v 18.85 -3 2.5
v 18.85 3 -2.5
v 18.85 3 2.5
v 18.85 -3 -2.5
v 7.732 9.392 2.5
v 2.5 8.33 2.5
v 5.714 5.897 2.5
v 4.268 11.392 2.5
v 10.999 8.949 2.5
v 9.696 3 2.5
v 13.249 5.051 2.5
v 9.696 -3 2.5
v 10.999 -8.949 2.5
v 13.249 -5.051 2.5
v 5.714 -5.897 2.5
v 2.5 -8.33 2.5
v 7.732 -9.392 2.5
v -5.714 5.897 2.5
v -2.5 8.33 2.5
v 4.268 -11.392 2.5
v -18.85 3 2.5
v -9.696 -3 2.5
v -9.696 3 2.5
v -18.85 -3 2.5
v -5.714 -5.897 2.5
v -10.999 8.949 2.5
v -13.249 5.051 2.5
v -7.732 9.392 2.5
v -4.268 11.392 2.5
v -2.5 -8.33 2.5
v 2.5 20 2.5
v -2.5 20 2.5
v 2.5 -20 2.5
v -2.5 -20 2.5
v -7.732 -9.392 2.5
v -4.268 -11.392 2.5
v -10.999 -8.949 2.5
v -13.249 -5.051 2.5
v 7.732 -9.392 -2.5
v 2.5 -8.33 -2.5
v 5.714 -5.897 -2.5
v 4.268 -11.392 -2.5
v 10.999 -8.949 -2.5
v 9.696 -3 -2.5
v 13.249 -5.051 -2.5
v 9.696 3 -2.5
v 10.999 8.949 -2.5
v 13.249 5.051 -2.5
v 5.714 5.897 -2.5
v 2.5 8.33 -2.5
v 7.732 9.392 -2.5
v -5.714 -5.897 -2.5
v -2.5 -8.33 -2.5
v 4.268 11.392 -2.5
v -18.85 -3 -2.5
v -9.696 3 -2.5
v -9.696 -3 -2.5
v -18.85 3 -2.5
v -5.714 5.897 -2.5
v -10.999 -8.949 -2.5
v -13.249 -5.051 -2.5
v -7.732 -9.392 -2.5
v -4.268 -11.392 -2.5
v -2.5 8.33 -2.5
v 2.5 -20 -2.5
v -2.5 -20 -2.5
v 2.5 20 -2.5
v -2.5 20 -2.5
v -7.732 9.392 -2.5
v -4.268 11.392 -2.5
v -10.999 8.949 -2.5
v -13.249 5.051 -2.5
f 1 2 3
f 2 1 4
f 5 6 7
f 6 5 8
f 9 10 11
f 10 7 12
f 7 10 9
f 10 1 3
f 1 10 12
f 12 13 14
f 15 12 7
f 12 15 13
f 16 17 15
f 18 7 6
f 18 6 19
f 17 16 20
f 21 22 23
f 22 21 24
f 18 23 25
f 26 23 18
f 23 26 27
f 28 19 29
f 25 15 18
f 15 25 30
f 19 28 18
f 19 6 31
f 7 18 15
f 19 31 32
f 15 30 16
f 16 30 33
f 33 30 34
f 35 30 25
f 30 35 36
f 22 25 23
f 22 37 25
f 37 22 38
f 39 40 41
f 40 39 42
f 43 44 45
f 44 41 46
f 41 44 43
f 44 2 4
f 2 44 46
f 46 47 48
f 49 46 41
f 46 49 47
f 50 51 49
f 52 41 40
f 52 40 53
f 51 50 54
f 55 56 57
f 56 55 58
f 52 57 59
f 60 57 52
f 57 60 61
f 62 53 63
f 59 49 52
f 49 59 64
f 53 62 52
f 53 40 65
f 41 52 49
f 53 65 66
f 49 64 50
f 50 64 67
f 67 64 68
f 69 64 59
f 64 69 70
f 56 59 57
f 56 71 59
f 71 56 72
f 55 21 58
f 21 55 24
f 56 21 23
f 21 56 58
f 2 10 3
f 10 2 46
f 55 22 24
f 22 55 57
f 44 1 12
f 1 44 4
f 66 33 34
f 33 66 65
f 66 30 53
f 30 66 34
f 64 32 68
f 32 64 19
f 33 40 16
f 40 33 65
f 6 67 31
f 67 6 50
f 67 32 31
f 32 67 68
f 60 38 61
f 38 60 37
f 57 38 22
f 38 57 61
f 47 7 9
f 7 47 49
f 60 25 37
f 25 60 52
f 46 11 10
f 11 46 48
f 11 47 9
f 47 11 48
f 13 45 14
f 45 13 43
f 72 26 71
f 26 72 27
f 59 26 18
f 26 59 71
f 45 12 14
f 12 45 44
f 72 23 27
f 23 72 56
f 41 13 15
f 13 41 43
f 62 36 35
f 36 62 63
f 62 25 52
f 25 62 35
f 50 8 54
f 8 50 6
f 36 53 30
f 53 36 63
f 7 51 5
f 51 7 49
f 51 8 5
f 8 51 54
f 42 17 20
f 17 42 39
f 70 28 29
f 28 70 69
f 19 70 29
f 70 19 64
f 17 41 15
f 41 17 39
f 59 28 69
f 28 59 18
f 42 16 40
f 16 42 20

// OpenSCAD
$fn=64;

th = 5.0;

module spoke(len, wid, h=th){
    cube([len, wid, h], center=true);
}

module starburst(){
    union(){
        // Dominant long bar (X direction)
        spoke(37.7, 6.0);

        // Shorter spokes at various angles
        rotate([0,0,90])  spoke(40.0, 5.0);
        rotate([0,0,30])  spoke(28.0, 4.5);
        rotate([0,0,-30]) spoke(28.0, 4.5);
        rotate([0,0,60])  spoke(24.0, 4.0);
        rotate([0,0,-60]) spoke(24.0, 4.0);
        rotate([0,0,15])  spoke(20.0, 3.8);
        rotate([0,0,-15]) spoke(20.0, 3.8);

        // Central hub
        cylinder(h=th, r=6.5, center=true);
    }
}

starburst();
